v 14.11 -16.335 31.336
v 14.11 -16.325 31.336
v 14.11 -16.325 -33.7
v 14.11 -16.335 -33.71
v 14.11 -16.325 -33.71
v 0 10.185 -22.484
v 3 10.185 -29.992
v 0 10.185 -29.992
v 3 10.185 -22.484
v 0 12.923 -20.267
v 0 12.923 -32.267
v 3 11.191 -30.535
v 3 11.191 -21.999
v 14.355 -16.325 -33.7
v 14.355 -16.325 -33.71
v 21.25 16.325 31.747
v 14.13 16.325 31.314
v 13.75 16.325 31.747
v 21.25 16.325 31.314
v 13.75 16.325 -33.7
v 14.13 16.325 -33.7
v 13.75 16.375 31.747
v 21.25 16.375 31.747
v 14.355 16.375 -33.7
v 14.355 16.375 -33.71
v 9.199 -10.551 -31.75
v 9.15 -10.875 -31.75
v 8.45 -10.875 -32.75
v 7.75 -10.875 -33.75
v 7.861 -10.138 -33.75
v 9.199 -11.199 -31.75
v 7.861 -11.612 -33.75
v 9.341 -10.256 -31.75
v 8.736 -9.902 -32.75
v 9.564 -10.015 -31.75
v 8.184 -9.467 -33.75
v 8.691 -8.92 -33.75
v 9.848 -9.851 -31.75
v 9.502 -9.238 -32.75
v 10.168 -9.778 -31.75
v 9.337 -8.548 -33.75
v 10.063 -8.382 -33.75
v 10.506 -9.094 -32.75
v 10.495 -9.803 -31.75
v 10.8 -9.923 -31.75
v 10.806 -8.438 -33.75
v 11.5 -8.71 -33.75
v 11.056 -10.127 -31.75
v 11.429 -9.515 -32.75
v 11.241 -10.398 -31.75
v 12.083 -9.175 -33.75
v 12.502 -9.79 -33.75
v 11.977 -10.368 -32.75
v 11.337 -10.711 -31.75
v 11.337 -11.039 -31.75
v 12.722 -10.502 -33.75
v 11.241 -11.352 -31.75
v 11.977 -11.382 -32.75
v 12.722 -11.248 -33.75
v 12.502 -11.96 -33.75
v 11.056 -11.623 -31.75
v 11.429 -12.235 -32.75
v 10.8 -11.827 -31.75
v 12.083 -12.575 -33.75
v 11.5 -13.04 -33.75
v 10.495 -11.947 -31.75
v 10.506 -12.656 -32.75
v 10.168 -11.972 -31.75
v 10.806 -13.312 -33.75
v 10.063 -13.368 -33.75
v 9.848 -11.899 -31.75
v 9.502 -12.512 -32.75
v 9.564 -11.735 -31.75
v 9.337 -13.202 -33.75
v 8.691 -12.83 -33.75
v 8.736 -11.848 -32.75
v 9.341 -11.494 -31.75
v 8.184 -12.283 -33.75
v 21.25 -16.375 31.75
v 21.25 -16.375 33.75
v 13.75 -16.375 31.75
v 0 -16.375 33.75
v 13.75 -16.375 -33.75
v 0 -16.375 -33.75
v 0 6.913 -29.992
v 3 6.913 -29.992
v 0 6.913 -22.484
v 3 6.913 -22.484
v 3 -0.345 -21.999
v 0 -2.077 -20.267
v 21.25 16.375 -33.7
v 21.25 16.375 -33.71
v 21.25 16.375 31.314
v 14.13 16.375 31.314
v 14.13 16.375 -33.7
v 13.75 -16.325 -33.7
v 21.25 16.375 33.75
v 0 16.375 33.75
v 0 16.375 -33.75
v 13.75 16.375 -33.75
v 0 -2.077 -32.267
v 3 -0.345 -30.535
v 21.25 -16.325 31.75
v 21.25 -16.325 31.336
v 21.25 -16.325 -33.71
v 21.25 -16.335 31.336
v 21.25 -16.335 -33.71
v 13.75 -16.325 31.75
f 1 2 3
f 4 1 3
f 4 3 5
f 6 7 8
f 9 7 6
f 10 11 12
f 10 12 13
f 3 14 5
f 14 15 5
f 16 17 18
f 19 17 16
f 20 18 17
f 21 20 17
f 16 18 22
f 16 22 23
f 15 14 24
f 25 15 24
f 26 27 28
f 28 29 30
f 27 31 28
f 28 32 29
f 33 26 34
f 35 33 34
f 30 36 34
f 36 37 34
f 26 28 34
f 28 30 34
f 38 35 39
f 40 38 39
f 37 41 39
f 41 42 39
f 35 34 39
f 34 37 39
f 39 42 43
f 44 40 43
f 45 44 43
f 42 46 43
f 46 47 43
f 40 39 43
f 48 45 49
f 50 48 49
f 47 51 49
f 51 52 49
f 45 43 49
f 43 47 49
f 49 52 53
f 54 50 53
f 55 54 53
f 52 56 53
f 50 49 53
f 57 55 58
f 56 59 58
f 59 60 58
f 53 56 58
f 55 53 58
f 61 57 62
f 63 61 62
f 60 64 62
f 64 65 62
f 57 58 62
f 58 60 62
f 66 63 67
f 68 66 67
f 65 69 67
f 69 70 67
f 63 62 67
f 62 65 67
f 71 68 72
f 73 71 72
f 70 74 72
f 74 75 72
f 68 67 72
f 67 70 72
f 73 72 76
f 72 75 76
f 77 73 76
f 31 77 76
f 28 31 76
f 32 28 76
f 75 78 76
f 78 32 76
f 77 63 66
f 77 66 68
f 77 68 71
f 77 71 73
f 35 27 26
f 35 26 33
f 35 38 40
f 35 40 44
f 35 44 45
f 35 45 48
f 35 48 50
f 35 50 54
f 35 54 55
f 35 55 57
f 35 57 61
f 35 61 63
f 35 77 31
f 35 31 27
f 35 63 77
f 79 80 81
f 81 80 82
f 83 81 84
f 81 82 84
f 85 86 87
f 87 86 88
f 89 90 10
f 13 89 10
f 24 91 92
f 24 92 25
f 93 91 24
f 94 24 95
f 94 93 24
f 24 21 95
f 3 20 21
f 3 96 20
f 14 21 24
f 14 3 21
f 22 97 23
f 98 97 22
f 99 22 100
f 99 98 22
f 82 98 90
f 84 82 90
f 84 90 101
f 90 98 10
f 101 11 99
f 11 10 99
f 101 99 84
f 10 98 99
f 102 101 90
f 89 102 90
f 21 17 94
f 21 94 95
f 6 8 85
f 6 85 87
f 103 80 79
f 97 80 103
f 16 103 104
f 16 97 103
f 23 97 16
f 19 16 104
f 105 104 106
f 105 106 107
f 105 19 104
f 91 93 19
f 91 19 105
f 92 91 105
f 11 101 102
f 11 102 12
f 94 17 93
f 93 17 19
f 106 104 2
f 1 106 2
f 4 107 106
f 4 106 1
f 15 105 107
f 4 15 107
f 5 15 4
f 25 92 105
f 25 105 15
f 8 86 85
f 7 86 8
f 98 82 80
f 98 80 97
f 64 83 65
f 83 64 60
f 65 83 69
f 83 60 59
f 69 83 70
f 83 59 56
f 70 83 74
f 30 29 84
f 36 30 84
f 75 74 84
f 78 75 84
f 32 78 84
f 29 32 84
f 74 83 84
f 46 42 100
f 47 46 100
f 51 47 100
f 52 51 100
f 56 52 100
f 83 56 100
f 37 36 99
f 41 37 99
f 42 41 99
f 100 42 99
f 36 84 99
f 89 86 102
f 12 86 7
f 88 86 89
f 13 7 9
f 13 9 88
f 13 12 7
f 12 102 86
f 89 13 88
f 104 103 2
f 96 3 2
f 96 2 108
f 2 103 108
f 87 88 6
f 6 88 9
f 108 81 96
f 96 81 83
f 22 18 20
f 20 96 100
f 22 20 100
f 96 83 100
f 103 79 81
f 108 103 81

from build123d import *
from build123d.topology import SkipClean

# Parameters (mm, degrees)
SKETCH2_W               = 67.5
SKETCH2_H               = 32.75
BOSS_EXTRUDE1_DEPTH     = 21.25
CUT_EXTRUDE3_DEPTH      = 52.606080068
CUT_EXTRUDE3_DEPTH_BACK = 0.05
SKETCH4_W               = 7.5
SKETCH4_H               = 32.7
CUT_EXTRUDE6_DEPTH      = 0.05
SKETCH5_W               = 7.5
SKETCH5_H               = 65.45
CUT_EXTRUDE7_DEPTH      = 0.05
SKETCH6_W               = 7.119941604
SKETCH6_H               = 65.013736252
BOSS_EXTRUDE9_DEPTH     = 0.05
SKETCH15_W              = 6.895148233
SKETCH15_H              = 32.7
BOSS_EXTRUDE14_DEPTH    = 0.01
SKETCH16_W              = 7.139794156
SKETCH16_H              = 65.046080354
BOSS_EXTRUDE15_DEPTH    = 0.01
SKETCH18_W              = 12
SKETCH18_H              = 15
CUT_EXTRUDE14_DEPTH     = 3
CUT_EXTRUDE14_DRAFT     = -30
SKETCH19_W              = 7.508639757
SKETCH19_H              = 3.271964709
BOSS_EXTRUDE16_DEPTH    = 3
SKETCH21_R              = 2.5
CUT_EXTRUDE17_DEPTH     = 2
CUT_EXTRUDE17_DRAFT     = -35


with BuildPart() as part:
    # Sketch2 → Boss-Extrude1 (new body)
    with BuildSketch(Plane(origin=(0, 0, 0), x_dir=(0, 0, -1), z_dir=(1, 0, 0))):
        Rectangle(SKETCH2_W, SKETCH2_H)
    extrude(amount=BOSS_EXTRUDE1_DEPTH)

    # Sketch3 → Cut-Extrude3 (cut, two sides: drawn at the far end of the back side and taken through both)
    with SkipClean():  # the faces are left unmerged after this step: merging them gives an invalid solid
        with BuildSketch(Plane(origin=(0, 16.375, 0), x_dir=(1, 0, 0), z_dir=(0, 1, 0)).offset(-CUT_EXTRUDE3_DEPTH_BACK)):
            with BuildLine():
                Line((-134.022457335, 33.75), (13.75, 33.75))
                Line((13.75, 33.75), (13.751, 33.75))
                Line((13.75, 33.75), (13.75, -31.747079321))
                Line((13.75, -31.747079321), (21.25, -31.747079321))
                Line((21.25, -31.747079321), (169.022457335, -31.747079321))
                Line((169.022457335, -31.747079321), (231.45697941, 257.127853894))
                Line((231.45697941, 257.127853894), (-71.58793526, 322.624933215))
                Line((-71.58793526, 322.624933215), (-134.022457335, 33.75))
            make_face()
        extrude(amount=CUT_EXTRUDE3_DEPTH + CUT_EXTRUDE3_DEPTH_BACK, mode=Mode.SUBTRACT)
    add(part.part.scale(1), mode=Mode.REPLACE)  # the faces are merged on a copy

    # Sketch4 → Cut-Extrude6 (cut)
    with BuildSketch(Plane(origin=(0, 0, -33.75), x_dir=(-1, 0, 0), z_dir=(0, 0, -1))):
        with Locations((-17.5, -0.025)):
            Rectangle(SKETCH4_W, SKETCH4_H)
    extrude(amount=-CUT_EXTRUDE6_DEPTH, mode=Mode.SUBTRACT)

    # Sketch5 → Cut-Extrude7 (cut)
    with BuildSketch(Plane(origin=(0, -16.375, 0), x_dir=(-1, 0, 0), z_dir=(0, -1, 0))):
        with Locations((-17.5, 0.975)):
            Rectangle(SKETCH5_W, SKETCH5_H)
    extrude(amount=-CUT_EXTRUDE7_DEPTH, mode=Mode.SUBTRACT)

    # Sketch6 → Boss-Extrude9 (add)
    with BuildSketch(Plane(origin=(0, 16.325, 0), x_dir=(1, 0, 0), z_dir=(0, 1, 0))):
        with Locations((17.690029198, 1.193131874)):
            Rectangle(SKETCH6_W, SKETCH6_H)
    extrude(amount=BOSS_EXTRUDE9_DEPTH)

    # Sketch15 → Boss-Extrude14 (add)
    with BuildSketch(Plane(origin=(0, 0, -33.7), x_dir=(-1, 0, 0), z_dir=(0, 0, -1))):
        with Locations((-17.802425883, 0.025)):
            Rectangle(SKETCH15_W, SKETCH15_H)
    extrude(amount=BOSS_EXTRUDE14_DEPTH)

    # Sketch16 → Boss-Extrude15 (add)
    with BuildSketch(Plane(origin=(0, -16.325, 0), x_dir=(-1, 0, 0), z_dir=(0, -1, 0))):
        with Locations((-17.680102922, 1.186959823)):
            Rectangle(SKETCH16_W, SKETCH16_H)
    extrude(amount=BOSS_EXTRUDE15_DEPTH)


with BuildPart() as cut_extrude14_tool:
    # Sketch18 → Cut-Extrude14 (with draft: the straight prism first)
    with BuildSketch(Plane.ZY):
        with Locations((-26.267087013, 5.422853248)):
            Rectangle(SKETCH18_W, SKETCH18_H)
    extrude(amount=-CUT_EXTRUDE14_DEPTH)
    # Cut-Extrude14: the draft: its side faces are tilted about the plane it starts from
    cut_extrude14_sides = [cut_extrude14_tool.faces().sort_by_distance(p)[0] for p in [
        (1.5, 5.422853248, -32.267087013),
        (1.5, -2.077146752, -26.267087013),
        (1.5, 5.422853248, -20.267087013),
        (1.5, 12.922853248, -26.267087013),
    ]]
    draft(cut_extrude14_sides, Plane.ZY, CUT_EXTRUDE14_DRAFT)


with BuildPart() as part_1:
    add(part.part)

    # Cut-Extrude14: cut by cut_extrude14_tool
    add(cut_extrude14_tool.part, mode=Mode.SUBTRACT)

    # Sketch19 → Boss-Extrude16 (add)
    with BuildSketch(Plane.ZY.offset(-3)):
        with Locations((-26.237986877, 8.548870353)):
            Rectangle(SKETCH19_W, SKETCH19_H)
    extrude(amount=BOSS_EXTRUDE16_DEPTH)


with BuildPart() as cut_extrude17_tool:
    # Sketch21 → Cut-Extrude17 (with draft: the straight prism first)
    with BuildSketch(Plane(origin=(0, 0, -33.75), x_dir=(-1, 0, 0), z_dir=(0, 0, -1))):
        with Locations((-10.25, -10.875)):
            Circle(SKETCH21_R)
    extrude(amount=-CUT_EXTRUDE17_DEPTH)
    # Cut-Extrude17: the draft: its side faces are tilted about the plane it starts from
    cut_extrude17_sides = [cut_extrude17_tool.faces().sort_by_distance(p)[0] for p in [
        (12.75, -10.875, -32.75),
    ]]
    draft(cut_extrude17_sides, Plane(origin=(0, 0, -33.75), x_dir=(-1, 0, 0), z_dir=(0, 0, -1)), CUT_EXTRUDE17_DRAFT)


with BuildPart() as part_2:
    add(part_1.part)

    # Cut-Extrude17: cut by cut_extrude17_tool
    add(cut_extrude17_tool.part, mode=Mode.SUBTRACT)


solid = part_2.part
